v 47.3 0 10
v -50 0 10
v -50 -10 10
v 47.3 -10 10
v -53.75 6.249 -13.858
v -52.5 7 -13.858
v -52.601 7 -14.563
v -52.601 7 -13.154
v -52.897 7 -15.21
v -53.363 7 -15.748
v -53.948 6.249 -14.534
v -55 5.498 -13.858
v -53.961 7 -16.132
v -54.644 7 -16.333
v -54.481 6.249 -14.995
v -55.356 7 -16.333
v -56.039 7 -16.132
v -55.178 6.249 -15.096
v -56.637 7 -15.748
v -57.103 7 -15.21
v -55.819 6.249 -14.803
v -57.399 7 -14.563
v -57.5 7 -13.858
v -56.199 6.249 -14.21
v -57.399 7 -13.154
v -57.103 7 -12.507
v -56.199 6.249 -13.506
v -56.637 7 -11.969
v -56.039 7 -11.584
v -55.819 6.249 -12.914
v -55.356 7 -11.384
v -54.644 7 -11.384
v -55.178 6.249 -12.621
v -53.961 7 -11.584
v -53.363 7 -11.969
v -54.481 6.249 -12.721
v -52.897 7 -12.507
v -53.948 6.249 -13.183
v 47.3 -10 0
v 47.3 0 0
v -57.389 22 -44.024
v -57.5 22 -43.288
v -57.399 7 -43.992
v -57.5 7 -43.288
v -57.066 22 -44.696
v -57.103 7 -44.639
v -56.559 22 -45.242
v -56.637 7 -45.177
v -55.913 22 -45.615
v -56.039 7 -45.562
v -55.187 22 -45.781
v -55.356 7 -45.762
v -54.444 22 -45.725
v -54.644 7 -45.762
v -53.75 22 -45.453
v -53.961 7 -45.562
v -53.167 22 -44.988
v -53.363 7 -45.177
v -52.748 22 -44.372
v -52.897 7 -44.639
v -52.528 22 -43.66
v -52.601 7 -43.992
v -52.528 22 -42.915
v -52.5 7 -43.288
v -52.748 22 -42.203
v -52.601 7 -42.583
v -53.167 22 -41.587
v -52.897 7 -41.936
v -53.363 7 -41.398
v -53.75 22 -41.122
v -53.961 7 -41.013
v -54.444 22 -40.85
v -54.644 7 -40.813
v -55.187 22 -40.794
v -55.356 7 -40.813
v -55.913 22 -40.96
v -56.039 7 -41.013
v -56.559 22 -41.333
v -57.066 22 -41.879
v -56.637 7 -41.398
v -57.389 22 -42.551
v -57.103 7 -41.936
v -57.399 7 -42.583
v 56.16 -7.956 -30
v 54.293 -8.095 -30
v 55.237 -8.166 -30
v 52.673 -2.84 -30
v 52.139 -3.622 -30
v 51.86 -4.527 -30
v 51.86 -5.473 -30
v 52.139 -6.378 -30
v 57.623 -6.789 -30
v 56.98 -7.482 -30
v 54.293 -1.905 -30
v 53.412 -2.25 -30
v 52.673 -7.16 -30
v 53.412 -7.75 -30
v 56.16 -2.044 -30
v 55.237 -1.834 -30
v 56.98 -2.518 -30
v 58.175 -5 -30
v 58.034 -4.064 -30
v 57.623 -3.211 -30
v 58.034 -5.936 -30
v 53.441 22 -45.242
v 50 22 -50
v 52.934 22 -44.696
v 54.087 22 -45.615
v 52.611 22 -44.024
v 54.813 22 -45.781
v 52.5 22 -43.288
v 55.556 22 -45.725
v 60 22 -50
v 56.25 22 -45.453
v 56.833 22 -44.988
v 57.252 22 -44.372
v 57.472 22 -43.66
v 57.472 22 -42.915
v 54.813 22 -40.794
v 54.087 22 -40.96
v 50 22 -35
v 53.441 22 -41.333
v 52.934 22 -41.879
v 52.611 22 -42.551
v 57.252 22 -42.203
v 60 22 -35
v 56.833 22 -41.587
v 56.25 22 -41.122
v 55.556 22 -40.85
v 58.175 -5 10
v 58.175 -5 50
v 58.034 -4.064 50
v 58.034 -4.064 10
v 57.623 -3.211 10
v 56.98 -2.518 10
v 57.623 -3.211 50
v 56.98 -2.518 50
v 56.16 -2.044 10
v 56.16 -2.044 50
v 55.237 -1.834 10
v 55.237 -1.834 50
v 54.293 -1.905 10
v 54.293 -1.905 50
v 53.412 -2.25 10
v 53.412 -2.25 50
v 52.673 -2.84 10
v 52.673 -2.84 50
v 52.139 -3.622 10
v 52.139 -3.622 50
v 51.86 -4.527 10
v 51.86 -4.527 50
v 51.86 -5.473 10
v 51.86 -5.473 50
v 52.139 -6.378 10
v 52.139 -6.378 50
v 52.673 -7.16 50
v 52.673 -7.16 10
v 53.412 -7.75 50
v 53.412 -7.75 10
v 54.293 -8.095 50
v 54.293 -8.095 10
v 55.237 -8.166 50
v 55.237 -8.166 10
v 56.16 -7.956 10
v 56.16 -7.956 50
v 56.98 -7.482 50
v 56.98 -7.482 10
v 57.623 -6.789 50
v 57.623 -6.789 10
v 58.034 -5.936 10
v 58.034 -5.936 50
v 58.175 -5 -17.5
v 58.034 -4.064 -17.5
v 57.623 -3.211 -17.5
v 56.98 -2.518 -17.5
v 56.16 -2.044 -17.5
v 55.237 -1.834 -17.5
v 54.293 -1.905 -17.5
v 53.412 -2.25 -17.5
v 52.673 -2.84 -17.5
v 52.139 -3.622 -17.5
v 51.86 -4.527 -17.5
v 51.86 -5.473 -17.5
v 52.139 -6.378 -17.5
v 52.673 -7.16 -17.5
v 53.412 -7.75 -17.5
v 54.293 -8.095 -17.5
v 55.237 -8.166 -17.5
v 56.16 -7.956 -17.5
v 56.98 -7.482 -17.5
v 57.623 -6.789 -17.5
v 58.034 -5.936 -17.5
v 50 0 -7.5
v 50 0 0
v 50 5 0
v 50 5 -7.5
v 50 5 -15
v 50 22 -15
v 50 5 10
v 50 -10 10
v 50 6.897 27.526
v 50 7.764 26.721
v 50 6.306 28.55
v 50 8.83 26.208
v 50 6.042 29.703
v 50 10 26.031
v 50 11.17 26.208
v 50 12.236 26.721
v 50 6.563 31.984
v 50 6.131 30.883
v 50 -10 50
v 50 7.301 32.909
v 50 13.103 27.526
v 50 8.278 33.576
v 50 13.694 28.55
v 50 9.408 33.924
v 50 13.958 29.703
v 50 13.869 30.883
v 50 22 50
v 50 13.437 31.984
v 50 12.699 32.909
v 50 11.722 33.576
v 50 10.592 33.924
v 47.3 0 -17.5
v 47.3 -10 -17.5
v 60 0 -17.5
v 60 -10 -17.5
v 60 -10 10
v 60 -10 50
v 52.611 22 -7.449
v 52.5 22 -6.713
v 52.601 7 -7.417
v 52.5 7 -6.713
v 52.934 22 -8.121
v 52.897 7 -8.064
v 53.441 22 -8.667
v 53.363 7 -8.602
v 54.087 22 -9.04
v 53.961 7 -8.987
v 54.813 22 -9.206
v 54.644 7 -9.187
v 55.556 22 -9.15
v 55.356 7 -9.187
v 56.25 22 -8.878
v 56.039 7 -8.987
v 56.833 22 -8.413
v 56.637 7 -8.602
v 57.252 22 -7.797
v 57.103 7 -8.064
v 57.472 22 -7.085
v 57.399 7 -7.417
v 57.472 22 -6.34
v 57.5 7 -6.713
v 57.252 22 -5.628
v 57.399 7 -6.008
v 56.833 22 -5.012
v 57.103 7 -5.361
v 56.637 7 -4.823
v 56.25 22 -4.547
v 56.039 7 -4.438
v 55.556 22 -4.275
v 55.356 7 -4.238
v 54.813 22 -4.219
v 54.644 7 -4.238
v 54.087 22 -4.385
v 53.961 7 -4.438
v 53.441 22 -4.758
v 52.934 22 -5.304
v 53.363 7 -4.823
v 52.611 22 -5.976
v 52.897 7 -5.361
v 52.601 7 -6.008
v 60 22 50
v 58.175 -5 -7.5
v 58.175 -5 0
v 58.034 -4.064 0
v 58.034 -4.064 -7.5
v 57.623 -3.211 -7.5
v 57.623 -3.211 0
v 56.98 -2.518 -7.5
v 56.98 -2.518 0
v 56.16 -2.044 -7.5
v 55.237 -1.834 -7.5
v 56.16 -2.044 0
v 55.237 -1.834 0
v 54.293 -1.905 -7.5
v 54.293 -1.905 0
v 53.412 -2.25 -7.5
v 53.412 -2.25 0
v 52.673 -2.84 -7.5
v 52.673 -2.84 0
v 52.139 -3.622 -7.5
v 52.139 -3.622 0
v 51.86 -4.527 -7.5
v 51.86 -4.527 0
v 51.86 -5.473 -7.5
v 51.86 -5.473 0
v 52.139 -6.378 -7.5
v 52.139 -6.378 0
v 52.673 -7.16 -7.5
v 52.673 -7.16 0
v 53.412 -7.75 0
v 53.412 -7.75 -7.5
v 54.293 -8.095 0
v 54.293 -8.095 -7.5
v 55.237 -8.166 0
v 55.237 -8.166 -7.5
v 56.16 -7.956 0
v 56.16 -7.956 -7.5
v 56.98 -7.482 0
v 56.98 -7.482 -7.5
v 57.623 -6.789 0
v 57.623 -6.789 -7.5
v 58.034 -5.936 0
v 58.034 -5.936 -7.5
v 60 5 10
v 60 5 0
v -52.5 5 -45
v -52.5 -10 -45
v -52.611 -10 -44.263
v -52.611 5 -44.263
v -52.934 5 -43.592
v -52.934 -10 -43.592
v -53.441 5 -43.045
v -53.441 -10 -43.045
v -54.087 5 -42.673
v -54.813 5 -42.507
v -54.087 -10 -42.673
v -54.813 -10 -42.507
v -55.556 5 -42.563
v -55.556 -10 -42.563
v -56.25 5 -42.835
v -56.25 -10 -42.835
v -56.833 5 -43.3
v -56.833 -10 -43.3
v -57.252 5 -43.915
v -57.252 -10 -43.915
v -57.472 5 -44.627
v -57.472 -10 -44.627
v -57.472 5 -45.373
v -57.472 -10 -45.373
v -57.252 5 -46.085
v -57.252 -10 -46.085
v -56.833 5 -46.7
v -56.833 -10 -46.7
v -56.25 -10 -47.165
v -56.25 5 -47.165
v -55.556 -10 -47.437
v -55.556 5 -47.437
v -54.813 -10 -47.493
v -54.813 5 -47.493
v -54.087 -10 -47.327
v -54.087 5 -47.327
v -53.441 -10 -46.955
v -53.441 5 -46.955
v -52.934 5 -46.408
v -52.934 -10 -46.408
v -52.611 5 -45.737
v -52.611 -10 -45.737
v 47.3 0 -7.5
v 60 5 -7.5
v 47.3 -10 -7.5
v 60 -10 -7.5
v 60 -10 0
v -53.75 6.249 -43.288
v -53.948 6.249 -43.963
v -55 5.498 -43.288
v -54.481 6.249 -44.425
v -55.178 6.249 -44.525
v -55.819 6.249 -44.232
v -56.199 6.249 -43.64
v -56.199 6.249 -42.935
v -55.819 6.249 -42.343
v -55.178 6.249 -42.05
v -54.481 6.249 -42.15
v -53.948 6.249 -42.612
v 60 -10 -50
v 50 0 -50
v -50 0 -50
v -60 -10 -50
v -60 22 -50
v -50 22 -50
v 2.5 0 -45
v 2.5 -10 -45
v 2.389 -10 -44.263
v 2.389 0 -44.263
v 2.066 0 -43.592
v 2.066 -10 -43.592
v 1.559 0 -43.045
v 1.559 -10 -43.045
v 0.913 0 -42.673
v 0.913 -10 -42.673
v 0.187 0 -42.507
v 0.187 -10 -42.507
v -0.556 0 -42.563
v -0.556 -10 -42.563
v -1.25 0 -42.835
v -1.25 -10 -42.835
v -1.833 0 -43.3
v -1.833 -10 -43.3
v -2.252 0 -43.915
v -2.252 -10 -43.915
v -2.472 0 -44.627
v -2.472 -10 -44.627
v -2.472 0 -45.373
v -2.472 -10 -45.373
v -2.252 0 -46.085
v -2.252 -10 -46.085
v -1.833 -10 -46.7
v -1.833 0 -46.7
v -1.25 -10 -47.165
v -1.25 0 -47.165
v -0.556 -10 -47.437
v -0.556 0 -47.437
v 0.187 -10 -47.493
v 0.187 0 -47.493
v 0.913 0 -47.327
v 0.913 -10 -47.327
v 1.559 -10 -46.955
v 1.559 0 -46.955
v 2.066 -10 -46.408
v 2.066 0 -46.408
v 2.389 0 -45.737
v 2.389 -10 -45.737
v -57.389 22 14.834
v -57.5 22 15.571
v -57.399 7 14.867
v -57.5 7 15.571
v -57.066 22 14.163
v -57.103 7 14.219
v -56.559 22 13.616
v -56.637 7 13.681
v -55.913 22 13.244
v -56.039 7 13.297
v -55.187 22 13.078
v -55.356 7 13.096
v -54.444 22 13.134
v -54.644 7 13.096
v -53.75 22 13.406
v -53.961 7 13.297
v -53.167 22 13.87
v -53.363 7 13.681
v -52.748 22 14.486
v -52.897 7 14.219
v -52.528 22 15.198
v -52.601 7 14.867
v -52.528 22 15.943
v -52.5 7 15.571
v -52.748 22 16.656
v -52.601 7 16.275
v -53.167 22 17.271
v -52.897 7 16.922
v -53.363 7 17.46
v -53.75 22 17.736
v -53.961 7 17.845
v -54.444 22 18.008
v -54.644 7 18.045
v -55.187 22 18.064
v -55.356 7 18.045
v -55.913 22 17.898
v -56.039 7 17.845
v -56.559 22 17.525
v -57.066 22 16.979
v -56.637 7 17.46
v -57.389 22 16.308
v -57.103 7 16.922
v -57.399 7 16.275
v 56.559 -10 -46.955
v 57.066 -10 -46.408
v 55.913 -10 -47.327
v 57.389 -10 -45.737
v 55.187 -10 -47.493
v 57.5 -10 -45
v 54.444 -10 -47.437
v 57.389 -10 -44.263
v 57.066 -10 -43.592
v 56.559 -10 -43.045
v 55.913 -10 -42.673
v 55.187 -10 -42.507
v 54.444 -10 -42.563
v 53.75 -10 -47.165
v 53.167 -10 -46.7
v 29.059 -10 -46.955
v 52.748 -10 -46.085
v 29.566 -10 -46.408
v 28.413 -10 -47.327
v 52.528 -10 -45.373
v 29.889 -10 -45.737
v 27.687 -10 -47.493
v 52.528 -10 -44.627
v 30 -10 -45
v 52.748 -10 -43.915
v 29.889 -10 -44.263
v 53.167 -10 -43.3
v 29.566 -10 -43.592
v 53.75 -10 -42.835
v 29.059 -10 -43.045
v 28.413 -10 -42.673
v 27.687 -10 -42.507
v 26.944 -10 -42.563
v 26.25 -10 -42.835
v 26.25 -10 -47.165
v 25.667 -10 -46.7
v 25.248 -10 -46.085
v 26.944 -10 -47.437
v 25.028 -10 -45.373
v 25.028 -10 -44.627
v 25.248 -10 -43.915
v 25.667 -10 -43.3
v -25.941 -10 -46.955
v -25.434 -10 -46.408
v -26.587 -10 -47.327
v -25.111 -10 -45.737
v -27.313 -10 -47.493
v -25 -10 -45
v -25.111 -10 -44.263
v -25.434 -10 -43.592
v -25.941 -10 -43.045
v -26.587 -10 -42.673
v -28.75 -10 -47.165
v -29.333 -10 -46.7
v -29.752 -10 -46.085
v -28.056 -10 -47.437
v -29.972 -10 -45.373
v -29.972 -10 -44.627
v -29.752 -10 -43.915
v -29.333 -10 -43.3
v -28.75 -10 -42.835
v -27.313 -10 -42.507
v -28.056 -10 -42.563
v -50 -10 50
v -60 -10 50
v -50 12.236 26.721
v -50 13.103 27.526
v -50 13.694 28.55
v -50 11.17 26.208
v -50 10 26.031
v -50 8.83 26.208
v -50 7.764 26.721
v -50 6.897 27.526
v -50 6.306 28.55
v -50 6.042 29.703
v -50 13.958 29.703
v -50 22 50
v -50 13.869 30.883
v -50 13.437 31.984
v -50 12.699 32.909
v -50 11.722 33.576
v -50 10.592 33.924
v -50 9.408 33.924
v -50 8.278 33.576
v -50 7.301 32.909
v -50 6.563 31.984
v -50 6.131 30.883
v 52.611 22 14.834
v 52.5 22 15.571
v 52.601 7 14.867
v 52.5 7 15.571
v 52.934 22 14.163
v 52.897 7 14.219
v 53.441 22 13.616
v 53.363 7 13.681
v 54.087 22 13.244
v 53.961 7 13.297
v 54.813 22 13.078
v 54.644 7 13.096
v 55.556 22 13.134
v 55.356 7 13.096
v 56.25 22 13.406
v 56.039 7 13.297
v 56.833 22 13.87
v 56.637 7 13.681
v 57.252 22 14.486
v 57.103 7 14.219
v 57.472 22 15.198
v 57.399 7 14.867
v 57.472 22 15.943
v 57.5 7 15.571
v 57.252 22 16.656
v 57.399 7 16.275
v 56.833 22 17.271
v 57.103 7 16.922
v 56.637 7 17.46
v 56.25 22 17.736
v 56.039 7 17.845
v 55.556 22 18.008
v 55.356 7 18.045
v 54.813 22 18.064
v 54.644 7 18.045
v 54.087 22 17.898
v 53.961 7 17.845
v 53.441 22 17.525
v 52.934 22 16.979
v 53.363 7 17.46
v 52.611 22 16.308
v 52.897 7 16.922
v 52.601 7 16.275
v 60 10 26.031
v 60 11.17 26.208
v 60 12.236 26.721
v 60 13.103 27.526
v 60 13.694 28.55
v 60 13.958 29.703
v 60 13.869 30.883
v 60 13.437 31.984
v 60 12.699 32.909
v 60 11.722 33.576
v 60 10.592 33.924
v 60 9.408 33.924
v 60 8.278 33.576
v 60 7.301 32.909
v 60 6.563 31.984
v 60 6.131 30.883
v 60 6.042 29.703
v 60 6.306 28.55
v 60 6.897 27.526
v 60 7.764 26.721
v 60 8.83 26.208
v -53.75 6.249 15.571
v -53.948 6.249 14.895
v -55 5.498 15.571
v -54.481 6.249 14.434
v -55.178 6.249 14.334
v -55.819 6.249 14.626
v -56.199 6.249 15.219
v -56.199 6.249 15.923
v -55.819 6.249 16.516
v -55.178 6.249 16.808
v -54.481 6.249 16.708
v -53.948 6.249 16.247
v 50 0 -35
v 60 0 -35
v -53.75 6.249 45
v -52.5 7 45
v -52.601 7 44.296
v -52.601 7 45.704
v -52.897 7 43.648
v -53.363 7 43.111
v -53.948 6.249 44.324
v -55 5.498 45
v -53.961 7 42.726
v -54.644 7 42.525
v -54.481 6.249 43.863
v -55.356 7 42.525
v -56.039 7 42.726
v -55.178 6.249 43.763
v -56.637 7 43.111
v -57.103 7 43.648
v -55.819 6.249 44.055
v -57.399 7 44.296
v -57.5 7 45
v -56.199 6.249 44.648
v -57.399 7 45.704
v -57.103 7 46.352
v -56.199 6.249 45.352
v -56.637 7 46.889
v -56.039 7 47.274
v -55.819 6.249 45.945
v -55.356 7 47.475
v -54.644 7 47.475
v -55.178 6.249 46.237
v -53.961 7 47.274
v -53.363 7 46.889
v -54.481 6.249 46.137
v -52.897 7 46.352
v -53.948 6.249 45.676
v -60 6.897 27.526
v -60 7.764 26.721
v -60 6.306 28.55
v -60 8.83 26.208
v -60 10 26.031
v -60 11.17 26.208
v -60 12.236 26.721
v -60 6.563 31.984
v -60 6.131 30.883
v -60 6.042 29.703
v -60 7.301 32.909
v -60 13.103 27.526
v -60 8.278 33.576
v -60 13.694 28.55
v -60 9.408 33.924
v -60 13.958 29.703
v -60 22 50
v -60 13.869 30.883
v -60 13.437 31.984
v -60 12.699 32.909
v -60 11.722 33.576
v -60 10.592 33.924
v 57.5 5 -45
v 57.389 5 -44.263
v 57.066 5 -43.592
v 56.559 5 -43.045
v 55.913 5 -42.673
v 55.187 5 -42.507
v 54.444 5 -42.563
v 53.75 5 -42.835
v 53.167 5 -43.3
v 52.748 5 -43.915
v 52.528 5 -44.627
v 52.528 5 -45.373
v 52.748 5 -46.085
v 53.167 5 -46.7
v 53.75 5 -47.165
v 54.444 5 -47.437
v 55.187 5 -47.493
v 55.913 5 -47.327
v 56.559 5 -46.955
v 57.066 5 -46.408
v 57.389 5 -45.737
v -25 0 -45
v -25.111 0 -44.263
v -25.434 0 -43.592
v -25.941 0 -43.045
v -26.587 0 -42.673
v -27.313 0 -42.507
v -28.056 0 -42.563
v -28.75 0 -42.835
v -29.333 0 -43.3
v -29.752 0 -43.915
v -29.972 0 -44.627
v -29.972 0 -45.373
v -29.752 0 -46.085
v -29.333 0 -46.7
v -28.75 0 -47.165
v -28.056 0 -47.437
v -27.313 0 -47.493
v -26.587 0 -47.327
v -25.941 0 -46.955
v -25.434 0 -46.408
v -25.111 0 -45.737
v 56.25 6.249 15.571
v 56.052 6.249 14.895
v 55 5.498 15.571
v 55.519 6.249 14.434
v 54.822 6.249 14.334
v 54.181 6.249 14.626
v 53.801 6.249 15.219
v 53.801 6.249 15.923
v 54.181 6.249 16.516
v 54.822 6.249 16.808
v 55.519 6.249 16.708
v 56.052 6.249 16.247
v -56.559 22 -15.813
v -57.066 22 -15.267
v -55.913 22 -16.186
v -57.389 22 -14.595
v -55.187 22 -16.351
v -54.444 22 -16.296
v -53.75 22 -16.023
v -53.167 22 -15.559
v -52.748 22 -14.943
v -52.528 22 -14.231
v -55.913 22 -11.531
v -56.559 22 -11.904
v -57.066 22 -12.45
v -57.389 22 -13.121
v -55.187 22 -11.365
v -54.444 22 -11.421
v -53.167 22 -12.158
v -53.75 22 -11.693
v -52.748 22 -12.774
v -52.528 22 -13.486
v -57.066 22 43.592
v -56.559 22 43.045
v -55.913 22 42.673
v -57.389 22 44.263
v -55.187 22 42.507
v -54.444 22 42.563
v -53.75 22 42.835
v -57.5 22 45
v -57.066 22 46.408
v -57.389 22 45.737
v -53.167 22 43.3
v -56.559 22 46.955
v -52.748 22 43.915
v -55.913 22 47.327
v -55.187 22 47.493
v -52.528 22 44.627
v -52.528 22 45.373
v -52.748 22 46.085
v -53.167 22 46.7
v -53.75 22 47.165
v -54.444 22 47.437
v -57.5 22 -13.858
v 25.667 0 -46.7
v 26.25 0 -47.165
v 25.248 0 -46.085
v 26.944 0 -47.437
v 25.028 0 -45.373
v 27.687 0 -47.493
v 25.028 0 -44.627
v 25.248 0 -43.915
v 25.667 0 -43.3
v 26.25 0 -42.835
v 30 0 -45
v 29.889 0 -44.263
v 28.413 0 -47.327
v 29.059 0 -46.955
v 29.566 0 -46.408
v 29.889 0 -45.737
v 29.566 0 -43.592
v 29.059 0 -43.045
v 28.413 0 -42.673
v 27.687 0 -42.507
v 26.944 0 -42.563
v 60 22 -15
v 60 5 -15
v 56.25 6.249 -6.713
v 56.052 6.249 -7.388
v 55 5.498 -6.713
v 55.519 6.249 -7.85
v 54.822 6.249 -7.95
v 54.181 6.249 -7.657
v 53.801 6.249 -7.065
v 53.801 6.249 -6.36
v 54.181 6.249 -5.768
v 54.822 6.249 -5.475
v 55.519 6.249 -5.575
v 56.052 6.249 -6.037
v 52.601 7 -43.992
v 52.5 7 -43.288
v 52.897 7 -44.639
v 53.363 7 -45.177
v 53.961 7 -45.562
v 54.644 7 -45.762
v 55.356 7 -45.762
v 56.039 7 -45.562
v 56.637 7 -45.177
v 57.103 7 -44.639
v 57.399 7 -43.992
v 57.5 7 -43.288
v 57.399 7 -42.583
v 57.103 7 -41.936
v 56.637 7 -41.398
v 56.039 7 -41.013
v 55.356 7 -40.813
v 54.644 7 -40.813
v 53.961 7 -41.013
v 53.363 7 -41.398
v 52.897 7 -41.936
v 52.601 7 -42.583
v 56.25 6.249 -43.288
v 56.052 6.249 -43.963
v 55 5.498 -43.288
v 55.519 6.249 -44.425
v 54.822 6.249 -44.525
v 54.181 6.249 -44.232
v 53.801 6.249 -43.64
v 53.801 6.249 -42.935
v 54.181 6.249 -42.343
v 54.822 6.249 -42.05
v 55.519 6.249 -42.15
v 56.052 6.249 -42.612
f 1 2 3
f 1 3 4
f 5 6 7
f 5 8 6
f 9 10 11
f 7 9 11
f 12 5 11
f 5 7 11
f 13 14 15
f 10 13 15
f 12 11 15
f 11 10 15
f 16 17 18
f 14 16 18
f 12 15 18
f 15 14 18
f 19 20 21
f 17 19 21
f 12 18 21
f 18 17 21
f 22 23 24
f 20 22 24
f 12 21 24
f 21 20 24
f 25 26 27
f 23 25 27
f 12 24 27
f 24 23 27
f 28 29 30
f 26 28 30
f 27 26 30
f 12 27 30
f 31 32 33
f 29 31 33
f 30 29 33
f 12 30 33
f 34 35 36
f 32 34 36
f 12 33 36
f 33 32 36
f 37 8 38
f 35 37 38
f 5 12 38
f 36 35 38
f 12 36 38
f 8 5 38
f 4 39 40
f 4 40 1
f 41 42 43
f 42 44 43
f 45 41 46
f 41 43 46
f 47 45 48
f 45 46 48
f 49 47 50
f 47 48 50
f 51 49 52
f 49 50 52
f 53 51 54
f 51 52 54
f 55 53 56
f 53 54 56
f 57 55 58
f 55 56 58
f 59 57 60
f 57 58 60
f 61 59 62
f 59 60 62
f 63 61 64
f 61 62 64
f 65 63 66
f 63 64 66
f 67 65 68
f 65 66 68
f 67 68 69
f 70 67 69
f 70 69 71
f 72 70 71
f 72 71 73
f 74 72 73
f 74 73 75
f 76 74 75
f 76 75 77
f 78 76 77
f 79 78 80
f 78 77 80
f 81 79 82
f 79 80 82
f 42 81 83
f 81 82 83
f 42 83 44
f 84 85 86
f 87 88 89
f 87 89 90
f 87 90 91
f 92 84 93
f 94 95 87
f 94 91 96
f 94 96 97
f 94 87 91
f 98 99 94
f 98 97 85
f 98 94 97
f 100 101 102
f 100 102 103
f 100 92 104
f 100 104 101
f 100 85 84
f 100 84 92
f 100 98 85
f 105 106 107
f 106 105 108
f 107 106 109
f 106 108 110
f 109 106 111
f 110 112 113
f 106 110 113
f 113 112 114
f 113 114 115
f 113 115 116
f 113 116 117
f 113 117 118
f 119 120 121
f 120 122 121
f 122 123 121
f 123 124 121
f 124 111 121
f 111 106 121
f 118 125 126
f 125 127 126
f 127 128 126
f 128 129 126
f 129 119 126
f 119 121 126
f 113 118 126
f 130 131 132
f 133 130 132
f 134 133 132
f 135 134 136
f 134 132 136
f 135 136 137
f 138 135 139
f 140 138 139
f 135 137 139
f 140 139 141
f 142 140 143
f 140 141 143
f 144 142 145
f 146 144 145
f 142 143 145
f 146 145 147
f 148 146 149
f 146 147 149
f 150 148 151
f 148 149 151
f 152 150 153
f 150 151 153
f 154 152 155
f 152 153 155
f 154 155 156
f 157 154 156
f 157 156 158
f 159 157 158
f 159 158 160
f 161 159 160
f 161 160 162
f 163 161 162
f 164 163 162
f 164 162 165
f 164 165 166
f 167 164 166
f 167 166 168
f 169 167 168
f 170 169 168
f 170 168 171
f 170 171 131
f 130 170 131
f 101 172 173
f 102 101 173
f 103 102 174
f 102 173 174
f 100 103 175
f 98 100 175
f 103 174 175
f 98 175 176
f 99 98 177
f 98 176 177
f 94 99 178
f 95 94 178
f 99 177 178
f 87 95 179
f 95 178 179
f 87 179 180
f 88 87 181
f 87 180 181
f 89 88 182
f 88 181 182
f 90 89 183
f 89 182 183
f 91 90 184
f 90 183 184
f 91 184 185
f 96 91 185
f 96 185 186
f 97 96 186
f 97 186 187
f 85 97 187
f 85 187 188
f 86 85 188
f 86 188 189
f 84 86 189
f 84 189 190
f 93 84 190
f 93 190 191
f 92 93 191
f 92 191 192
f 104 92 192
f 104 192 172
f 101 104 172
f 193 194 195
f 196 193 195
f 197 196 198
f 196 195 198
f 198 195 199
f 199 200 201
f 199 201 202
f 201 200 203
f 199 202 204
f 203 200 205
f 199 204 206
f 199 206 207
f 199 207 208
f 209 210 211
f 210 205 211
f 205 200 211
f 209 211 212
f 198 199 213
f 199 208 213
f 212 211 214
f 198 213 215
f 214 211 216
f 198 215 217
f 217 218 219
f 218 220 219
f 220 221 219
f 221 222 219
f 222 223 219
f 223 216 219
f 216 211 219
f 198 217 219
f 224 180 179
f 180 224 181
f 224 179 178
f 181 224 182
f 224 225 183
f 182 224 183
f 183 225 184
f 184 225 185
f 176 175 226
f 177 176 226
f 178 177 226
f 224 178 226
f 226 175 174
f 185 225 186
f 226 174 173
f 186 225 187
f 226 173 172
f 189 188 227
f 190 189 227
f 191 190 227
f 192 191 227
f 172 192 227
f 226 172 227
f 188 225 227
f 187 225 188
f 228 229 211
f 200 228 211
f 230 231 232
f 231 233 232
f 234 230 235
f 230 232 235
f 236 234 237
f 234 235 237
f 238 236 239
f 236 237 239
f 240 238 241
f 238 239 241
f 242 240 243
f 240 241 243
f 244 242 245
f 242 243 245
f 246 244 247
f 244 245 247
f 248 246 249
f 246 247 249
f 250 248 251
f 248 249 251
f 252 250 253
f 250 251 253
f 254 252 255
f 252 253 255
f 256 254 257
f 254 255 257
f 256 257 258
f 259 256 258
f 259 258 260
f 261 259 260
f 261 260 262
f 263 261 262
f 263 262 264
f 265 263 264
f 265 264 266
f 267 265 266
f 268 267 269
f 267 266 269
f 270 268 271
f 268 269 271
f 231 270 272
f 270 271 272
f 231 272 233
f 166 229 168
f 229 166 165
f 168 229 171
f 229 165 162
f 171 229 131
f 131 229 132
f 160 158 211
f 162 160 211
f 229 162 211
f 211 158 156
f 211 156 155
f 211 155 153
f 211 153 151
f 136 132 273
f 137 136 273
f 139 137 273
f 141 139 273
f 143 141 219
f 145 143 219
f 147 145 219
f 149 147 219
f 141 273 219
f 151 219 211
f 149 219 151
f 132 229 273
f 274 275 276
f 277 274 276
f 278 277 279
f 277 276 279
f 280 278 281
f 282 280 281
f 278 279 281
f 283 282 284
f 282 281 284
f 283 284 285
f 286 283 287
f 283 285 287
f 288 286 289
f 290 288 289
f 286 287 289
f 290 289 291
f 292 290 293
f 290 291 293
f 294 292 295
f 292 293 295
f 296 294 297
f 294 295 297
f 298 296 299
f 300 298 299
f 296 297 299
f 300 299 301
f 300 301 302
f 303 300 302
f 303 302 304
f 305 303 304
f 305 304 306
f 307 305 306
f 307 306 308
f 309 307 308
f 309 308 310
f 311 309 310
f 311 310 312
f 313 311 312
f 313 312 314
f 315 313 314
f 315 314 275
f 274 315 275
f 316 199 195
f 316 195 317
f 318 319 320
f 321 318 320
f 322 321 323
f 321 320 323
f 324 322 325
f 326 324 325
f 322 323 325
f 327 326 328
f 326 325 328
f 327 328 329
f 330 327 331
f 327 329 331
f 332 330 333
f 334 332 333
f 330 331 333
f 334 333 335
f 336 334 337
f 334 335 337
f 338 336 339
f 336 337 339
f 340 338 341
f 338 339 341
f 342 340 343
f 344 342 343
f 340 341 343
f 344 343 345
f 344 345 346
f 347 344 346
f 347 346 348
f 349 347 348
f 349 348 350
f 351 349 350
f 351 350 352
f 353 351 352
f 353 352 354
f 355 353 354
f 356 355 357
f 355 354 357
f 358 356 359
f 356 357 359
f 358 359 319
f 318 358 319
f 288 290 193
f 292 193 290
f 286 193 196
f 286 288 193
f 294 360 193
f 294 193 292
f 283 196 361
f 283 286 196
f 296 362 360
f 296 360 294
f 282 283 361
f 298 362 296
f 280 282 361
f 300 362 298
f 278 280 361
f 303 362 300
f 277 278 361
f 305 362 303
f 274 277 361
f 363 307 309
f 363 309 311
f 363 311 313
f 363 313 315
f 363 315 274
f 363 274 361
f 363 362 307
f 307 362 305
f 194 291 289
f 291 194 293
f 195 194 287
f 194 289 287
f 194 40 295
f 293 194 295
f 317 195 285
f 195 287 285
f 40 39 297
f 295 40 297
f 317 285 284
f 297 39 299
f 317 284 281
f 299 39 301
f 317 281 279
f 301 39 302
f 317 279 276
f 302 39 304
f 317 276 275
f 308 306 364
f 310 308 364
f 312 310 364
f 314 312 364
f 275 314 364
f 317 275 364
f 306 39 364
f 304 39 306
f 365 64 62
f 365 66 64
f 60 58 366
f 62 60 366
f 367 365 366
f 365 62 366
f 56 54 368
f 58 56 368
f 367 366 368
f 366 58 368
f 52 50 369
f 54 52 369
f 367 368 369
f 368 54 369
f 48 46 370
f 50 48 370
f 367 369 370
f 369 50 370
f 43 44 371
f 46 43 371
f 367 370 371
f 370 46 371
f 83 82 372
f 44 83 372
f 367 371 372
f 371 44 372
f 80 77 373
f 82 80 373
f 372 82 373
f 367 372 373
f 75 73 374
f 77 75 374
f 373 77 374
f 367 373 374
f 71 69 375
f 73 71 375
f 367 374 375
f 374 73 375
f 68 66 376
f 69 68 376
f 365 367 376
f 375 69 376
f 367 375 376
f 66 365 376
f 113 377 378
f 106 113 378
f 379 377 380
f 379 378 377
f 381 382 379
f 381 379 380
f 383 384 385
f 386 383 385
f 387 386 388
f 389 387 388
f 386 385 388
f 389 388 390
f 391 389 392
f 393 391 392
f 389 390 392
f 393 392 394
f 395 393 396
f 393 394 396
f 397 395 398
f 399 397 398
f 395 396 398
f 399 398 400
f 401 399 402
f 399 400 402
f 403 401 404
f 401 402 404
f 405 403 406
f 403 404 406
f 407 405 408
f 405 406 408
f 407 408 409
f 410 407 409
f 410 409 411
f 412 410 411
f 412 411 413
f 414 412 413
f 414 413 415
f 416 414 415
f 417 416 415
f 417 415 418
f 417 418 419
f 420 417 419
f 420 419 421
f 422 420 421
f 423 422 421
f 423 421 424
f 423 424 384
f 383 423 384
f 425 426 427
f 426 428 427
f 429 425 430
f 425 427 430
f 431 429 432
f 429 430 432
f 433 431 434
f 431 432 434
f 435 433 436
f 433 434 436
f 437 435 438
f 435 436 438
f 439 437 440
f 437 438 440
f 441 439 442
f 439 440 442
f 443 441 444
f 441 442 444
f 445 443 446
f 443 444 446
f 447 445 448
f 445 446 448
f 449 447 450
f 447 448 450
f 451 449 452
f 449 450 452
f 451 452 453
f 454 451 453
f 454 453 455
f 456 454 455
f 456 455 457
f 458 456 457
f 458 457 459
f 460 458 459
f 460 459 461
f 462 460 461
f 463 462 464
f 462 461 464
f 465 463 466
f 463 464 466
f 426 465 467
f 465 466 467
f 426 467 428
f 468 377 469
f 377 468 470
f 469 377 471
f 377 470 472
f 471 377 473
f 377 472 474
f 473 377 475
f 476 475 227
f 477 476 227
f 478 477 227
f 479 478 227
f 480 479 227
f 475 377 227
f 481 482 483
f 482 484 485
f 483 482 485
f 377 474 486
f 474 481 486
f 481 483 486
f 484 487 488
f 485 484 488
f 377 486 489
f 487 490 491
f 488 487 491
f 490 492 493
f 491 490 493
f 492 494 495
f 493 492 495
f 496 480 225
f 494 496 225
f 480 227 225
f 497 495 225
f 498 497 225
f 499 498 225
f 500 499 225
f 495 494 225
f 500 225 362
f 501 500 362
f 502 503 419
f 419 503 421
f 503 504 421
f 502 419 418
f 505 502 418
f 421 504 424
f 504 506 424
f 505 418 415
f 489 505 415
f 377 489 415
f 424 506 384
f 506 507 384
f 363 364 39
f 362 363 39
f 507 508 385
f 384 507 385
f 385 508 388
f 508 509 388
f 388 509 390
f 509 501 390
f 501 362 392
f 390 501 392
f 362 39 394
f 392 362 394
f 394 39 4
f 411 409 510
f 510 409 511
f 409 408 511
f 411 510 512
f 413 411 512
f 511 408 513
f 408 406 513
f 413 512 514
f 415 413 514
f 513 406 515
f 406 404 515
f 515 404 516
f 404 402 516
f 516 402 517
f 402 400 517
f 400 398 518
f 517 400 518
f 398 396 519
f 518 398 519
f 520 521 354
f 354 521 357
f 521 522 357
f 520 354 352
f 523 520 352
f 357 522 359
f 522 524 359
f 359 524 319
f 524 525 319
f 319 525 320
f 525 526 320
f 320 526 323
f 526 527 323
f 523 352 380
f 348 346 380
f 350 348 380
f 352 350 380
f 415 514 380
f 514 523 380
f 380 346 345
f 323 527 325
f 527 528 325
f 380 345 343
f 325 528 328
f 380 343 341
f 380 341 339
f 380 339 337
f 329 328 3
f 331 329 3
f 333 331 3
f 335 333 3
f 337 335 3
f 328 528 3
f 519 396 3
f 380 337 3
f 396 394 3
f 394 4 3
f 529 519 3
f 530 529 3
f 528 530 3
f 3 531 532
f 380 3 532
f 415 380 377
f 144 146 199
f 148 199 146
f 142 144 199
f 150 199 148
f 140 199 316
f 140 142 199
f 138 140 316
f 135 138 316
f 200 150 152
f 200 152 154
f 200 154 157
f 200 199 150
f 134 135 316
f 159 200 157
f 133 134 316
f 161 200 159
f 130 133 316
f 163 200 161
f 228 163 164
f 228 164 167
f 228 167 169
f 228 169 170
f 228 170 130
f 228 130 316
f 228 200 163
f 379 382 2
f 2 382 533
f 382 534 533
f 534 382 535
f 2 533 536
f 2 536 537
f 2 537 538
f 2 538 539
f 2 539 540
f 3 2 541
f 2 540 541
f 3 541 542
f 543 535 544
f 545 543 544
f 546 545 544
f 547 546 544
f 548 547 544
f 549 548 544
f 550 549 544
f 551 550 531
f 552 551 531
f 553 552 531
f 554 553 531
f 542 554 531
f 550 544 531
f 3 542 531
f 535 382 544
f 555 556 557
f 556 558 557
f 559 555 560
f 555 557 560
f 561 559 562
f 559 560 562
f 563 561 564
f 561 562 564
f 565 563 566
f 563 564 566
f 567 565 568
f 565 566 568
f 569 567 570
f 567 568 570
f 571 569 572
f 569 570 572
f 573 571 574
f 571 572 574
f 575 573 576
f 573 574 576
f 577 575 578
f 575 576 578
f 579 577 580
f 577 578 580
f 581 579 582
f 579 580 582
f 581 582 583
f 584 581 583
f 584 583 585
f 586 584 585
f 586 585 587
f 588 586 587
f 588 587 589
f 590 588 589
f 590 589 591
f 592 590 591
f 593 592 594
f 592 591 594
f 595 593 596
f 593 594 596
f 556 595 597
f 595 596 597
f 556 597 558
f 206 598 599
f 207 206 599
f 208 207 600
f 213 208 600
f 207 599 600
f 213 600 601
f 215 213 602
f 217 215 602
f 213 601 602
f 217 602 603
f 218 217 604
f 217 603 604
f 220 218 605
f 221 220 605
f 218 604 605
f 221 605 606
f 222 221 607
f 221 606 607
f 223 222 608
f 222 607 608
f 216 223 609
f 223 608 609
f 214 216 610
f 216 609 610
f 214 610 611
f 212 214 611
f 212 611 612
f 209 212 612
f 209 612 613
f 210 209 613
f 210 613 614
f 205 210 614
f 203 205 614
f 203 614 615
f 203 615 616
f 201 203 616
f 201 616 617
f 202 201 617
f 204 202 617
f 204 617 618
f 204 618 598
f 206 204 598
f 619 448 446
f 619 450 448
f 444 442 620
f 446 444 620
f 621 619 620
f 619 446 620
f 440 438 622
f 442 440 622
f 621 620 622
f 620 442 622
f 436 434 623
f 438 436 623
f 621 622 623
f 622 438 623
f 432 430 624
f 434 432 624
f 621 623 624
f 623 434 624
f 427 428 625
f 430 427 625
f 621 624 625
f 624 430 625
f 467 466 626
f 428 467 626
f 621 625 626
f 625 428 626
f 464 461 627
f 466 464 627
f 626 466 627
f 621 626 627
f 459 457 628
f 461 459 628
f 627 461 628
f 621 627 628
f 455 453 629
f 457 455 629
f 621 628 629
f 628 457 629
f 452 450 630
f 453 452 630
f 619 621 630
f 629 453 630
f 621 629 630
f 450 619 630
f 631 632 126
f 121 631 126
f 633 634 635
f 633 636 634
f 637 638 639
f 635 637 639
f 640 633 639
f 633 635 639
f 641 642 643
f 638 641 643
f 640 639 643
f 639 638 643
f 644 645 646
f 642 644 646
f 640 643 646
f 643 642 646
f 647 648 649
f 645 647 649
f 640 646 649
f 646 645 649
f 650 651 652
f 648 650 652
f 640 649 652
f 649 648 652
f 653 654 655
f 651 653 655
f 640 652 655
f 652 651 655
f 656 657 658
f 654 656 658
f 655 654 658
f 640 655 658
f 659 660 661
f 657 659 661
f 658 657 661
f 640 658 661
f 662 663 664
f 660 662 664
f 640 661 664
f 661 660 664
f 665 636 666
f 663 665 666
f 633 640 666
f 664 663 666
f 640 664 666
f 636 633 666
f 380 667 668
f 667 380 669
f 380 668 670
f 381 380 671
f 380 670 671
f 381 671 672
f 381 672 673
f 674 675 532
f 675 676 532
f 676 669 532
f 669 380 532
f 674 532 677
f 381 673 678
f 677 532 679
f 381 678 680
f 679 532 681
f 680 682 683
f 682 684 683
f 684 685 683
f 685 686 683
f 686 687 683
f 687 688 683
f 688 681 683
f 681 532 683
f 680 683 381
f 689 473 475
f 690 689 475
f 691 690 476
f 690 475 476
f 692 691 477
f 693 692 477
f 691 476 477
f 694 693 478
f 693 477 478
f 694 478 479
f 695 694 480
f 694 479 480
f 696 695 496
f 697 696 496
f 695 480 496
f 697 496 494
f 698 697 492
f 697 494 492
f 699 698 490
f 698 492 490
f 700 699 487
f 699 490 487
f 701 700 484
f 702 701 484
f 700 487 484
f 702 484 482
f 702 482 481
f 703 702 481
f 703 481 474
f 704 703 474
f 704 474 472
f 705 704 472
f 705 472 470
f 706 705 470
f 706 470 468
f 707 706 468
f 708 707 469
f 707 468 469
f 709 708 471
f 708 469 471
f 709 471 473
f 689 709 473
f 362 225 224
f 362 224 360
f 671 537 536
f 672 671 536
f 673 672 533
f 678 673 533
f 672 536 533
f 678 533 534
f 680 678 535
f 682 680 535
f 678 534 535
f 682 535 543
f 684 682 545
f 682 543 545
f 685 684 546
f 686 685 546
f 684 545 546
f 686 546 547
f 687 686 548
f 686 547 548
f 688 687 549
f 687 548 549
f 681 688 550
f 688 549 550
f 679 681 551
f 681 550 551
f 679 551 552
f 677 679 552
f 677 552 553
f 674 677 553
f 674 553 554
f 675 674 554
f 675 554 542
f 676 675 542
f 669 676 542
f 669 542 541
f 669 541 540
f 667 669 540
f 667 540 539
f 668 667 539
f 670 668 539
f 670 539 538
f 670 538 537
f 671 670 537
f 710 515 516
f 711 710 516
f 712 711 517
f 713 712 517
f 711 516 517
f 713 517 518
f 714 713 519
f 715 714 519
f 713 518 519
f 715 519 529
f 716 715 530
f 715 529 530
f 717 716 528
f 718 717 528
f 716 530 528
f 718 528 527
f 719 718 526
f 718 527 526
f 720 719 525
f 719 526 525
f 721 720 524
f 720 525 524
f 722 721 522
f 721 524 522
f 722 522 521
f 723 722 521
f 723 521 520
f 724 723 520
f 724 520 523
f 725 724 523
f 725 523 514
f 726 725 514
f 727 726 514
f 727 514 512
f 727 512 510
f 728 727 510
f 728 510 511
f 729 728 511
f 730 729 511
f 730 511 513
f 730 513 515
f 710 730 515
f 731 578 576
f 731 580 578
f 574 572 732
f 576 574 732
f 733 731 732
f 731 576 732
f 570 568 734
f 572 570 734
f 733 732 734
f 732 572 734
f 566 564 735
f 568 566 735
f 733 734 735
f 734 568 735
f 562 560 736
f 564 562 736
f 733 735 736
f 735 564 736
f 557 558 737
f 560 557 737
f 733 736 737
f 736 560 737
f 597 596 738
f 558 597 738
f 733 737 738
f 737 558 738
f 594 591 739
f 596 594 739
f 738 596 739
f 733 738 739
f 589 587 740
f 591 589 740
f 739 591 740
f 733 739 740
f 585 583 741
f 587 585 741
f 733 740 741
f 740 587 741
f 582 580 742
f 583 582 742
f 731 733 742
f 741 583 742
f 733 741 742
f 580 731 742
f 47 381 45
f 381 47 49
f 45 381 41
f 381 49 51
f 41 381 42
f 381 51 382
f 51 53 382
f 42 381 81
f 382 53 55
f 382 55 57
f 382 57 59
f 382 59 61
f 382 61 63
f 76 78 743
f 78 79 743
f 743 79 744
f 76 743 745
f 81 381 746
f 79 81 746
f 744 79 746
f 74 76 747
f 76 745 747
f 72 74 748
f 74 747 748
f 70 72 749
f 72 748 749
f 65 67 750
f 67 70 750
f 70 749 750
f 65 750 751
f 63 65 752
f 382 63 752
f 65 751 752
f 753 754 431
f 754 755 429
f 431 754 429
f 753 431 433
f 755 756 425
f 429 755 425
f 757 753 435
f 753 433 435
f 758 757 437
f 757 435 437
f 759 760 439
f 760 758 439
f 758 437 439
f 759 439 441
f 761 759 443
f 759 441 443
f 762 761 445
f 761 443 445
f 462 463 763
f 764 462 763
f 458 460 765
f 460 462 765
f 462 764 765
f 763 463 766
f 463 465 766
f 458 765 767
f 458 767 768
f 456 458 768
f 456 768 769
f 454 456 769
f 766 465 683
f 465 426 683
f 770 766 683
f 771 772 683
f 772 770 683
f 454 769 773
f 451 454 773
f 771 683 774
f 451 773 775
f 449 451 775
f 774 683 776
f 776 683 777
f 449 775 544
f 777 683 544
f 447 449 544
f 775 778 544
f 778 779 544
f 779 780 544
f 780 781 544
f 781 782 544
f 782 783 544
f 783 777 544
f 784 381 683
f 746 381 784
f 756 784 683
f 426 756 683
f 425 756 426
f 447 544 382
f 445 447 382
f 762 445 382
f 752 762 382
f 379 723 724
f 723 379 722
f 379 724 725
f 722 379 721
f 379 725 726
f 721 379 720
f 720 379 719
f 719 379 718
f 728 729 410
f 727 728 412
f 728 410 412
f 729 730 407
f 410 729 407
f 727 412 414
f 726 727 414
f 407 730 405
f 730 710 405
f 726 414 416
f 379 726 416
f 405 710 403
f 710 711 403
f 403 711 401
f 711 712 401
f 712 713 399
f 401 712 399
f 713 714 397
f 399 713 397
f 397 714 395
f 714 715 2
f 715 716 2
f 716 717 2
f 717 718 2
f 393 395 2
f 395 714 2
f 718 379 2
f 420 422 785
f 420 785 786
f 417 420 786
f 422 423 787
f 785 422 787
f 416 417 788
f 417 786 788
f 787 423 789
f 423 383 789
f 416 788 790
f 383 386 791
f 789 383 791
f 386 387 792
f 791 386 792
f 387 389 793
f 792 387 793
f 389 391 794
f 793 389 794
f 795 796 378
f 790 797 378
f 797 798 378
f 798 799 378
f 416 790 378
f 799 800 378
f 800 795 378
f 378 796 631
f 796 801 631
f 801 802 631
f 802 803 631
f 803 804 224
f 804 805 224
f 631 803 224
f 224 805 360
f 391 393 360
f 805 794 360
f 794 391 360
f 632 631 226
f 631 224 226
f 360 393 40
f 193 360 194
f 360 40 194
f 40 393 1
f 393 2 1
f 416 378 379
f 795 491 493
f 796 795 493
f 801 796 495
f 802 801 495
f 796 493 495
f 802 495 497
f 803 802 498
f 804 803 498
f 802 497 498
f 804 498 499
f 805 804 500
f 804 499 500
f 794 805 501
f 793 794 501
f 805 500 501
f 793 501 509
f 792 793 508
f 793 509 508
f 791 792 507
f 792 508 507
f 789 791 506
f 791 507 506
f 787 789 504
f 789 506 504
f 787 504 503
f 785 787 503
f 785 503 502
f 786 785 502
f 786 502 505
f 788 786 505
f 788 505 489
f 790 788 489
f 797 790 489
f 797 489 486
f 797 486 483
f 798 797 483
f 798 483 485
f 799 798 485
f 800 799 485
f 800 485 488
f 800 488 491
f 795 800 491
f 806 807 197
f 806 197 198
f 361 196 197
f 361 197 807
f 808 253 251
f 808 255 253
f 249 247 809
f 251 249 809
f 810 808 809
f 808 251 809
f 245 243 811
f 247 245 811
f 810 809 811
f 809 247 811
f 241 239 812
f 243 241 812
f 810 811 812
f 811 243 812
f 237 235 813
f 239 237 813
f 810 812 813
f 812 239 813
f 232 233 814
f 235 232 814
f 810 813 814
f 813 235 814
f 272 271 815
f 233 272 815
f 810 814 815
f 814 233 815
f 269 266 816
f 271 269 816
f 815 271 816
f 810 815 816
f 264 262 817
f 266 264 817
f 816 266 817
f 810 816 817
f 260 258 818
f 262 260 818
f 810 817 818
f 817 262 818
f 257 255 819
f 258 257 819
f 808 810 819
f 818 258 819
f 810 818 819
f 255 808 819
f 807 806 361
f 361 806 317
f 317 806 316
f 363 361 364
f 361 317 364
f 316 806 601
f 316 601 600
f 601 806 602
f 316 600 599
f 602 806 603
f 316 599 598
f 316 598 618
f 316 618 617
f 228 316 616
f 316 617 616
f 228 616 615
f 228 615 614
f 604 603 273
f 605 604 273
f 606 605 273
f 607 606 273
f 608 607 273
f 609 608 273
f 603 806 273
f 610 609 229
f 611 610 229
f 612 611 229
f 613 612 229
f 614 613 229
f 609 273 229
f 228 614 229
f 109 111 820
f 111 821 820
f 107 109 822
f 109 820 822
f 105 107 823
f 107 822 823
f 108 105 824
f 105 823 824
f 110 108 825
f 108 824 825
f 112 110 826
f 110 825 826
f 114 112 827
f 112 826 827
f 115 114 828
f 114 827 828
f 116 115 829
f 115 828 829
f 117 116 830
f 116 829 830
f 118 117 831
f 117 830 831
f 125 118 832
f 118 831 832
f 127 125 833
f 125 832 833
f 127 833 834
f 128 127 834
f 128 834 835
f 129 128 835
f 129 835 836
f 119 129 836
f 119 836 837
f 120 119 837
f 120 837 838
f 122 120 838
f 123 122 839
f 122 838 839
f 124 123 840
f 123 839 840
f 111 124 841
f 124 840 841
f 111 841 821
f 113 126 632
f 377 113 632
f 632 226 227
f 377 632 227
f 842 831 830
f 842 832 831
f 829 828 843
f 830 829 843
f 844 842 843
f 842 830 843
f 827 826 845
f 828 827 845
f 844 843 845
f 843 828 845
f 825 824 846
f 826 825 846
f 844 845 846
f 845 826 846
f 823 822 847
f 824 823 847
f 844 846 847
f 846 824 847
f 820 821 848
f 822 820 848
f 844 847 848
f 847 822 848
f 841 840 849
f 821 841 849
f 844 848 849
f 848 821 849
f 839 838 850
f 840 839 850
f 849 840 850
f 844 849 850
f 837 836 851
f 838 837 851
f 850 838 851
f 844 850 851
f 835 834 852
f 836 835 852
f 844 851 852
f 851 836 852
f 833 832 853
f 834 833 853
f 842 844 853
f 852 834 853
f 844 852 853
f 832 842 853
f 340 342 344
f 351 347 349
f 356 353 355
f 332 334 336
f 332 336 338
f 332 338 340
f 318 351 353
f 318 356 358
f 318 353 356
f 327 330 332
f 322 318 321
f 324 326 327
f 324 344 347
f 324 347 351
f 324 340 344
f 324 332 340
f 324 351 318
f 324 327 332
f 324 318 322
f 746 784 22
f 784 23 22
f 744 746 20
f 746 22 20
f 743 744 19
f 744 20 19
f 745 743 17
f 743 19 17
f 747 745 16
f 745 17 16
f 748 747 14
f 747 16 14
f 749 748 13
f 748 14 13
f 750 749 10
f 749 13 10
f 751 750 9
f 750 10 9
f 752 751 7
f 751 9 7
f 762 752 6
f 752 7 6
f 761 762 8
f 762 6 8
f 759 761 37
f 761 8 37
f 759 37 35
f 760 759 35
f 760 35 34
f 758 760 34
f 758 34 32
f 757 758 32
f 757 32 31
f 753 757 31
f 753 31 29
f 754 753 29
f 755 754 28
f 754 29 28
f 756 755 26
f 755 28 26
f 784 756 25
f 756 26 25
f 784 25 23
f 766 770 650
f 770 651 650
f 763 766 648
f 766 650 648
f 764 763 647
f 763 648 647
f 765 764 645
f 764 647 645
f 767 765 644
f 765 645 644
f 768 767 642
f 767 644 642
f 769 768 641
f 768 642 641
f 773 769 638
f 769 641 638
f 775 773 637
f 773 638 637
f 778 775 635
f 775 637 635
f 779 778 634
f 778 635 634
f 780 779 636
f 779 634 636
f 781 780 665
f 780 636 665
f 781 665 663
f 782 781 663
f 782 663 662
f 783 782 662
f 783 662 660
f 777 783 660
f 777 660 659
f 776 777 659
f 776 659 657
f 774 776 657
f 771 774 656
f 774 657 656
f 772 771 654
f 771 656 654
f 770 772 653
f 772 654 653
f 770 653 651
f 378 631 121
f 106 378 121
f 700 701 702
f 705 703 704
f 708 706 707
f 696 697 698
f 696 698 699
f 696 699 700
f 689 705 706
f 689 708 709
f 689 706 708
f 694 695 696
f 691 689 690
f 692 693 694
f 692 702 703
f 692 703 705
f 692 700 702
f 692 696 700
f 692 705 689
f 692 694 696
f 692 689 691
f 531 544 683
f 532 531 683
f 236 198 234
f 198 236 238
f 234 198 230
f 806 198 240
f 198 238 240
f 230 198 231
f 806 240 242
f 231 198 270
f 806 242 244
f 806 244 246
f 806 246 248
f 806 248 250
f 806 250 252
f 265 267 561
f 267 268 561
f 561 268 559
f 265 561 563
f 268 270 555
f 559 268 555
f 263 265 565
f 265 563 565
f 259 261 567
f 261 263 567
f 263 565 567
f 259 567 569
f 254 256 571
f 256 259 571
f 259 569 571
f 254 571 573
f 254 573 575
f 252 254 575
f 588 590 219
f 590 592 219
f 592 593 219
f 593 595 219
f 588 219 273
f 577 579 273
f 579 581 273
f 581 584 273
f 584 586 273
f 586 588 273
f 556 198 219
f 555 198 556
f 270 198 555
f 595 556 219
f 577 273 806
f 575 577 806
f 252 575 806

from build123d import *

# Parameters (mm, degrees)
BOSS_EXTRUDE3_DEPTH       = 50
SKETCH7_W                 = 100
SKETCH7_H                 = 40
CUT_EXTRUDE1_DEPTH        = 11
SKETCH8_R                 = 3.96875
CUT_EXTRUDE2_DEPTH        = 121
CUT_EXTRUDE3_REACH        = 122
SKETCH9_W                 = 20
SKETCH9_H                 = 22
SKETCH10_R                = 3.175
CUT_EXTRUDE4_DEPTH        = 80
SKETCH11_W                = 12.7
SKETCH11_H                = 10
CUT_EXTRUDE5_DEPTH        = 15
F_5_0MM_DOWEL_HOLE1_D     = 5
F_5_0MM_DOWEL_HOLE1_DEPTH = 25
F_5_0MM_DOWEL_HOLE1_TIP   = 1.502151548
SKETCH15_R                = 2.5
CUT_EXTRUDE6_DEPTH        = 15


with BuildPart() as part:
    # Sketch6 → Boss-Extrude3 (new body, symmetric)
    with BuildSketch(Plane.XY):
        Polygon((-60, 22), (-50, 22), (-50, 0), (50, 0), (50, 22), (60, 22), (60, -10), (-60, -10), align=None)
    extrude(amount=BOSS_EXTRUDE3_DEPTH, both=True)

    # Sketch7 → Cut-Extrude1 (cut, through all)
    with BuildSketch(Plane(origin=(0, 0, 0), x_dir=(1, 0, 0), z_dir=(0, 1, 0))):
        with Locations((0, -30)):
            Rectangle(SKETCH7_W, SKETCH7_H)
    extrude(amount=-CUT_EXTRUDE1_DEPTH, mode=Mode.SUBTRACT)

    # Sketch8 → Cut-Extrude2 (cut, through all)
    with BuildSketch(Plane(origin=(60, 0, 0), x_dir=(0, 0, -1), z_dir=(1, 0, 0))):
        with Locations((-30, 10)):
            Circle(SKETCH8_R)
    extrude(amount=-CUT_EXTRUDE2_DEPTH, mode=Mode.SUBTRACT)

    # Sketch9 → Cut-Extrude3 (cut, up to next)
    with BuildSketch(Plane(origin=(60, 0, 0), x_dir=(0, 0, -1), z_dir=(1, 0, 0)), mode=Mode.PRIVATE) as cut_extrude3_sk1:
        with Locations((25, 11)):
            Rectangle(SKETCH9_W, SKETCH9_H)
    cut_extrude3_tool1 = extrude(cut_extrude3_sk1.sketch, amount=-CUT_EXTRUDE3_REACH, mode=Mode.PRIVATE) & part.part
    add(cut_extrude3_tool1.solids().sort_by_distance((60, 11, -25))[0], mode=Mode.SUBTRACT)

    # Sketch10 → Cut-Extrude4 (cut)
    with BuildSketch(Plane.XY.offset(50)):
        with Locations((55, -5)):
            Circle(SKETCH10_R)
    extrude(amount=-CUT_EXTRUDE4_DEPTH, mode=Mode.SUBTRACT)

    # Sketch11 → Cut-Extrude5 (cut)
    with BuildSketch(Plane.XZ.offset(10)):
        with Locations((53.65, 5)):
            Rectangle(SKETCH11_W, SKETCH11_H)
        with Locations((53.65, -12.5)):
            Rectangle(SKETCH11_W, SKETCH11_H)
    extrude(amount=-CUT_EXTRUDE5_DEPTH, mode=Mode.SUBTRACT)

    # Ø5.0mm Dowel Hole1
    with Locations(Plane(origin=(-676.293536786, 32, -1303.282701689), x_dir=(1, 0, 0), z_dir=(0, 1, 0))):
        with Locations((731.293536786, -1318.853535022), (621.293536786, -1318.853535022), (621.293536786, -1348.282701689), (621.293536786, -1259.995201689), (731.293536786, -1259.995201689), (731.293536786, -1296.570201689), (621.293536786, -1289.424368355)):
            Hole(F_5_0MM_DOWEL_HOLE1_D / 2, depth=F_5_0MM_DOWEL_HOLE1_DEPTH)
            with Locations((0, 0, -(F_5_0MM_DOWEL_HOLE1_DEPTH + F_5_0MM_DOWEL_HOLE1_TIP / 2))):  # 118° drill point
                Cone(0, F_5_0MM_DOWEL_HOLE1_D / 2, F_5_0MM_DOWEL_HOLE1_TIP, mode=Mode.SUBTRACT)

    # Sketch15 → Cut-Extrude6 (cut)
    with BuildSketch(Plane.XZ.offset(10)):
        with Locations((-55, -45)):
            Circle(SKETCH15_R)
        with Locations((-27.5, -45)):
            Circle(SKETCH15_R)
        with Locations((0, -45)):
            Circle(SKETCH15_R)
        with Locations((27.5, -45)):
            Circle(SKETCH15_R)
        with Locations((55, -45)):
            Circle(SKETCH15_R)
    extrude(amount=-CUT_EXTRUDE6_DEPTH, mode=Mode.SUBTRACT)


solid = part.part
